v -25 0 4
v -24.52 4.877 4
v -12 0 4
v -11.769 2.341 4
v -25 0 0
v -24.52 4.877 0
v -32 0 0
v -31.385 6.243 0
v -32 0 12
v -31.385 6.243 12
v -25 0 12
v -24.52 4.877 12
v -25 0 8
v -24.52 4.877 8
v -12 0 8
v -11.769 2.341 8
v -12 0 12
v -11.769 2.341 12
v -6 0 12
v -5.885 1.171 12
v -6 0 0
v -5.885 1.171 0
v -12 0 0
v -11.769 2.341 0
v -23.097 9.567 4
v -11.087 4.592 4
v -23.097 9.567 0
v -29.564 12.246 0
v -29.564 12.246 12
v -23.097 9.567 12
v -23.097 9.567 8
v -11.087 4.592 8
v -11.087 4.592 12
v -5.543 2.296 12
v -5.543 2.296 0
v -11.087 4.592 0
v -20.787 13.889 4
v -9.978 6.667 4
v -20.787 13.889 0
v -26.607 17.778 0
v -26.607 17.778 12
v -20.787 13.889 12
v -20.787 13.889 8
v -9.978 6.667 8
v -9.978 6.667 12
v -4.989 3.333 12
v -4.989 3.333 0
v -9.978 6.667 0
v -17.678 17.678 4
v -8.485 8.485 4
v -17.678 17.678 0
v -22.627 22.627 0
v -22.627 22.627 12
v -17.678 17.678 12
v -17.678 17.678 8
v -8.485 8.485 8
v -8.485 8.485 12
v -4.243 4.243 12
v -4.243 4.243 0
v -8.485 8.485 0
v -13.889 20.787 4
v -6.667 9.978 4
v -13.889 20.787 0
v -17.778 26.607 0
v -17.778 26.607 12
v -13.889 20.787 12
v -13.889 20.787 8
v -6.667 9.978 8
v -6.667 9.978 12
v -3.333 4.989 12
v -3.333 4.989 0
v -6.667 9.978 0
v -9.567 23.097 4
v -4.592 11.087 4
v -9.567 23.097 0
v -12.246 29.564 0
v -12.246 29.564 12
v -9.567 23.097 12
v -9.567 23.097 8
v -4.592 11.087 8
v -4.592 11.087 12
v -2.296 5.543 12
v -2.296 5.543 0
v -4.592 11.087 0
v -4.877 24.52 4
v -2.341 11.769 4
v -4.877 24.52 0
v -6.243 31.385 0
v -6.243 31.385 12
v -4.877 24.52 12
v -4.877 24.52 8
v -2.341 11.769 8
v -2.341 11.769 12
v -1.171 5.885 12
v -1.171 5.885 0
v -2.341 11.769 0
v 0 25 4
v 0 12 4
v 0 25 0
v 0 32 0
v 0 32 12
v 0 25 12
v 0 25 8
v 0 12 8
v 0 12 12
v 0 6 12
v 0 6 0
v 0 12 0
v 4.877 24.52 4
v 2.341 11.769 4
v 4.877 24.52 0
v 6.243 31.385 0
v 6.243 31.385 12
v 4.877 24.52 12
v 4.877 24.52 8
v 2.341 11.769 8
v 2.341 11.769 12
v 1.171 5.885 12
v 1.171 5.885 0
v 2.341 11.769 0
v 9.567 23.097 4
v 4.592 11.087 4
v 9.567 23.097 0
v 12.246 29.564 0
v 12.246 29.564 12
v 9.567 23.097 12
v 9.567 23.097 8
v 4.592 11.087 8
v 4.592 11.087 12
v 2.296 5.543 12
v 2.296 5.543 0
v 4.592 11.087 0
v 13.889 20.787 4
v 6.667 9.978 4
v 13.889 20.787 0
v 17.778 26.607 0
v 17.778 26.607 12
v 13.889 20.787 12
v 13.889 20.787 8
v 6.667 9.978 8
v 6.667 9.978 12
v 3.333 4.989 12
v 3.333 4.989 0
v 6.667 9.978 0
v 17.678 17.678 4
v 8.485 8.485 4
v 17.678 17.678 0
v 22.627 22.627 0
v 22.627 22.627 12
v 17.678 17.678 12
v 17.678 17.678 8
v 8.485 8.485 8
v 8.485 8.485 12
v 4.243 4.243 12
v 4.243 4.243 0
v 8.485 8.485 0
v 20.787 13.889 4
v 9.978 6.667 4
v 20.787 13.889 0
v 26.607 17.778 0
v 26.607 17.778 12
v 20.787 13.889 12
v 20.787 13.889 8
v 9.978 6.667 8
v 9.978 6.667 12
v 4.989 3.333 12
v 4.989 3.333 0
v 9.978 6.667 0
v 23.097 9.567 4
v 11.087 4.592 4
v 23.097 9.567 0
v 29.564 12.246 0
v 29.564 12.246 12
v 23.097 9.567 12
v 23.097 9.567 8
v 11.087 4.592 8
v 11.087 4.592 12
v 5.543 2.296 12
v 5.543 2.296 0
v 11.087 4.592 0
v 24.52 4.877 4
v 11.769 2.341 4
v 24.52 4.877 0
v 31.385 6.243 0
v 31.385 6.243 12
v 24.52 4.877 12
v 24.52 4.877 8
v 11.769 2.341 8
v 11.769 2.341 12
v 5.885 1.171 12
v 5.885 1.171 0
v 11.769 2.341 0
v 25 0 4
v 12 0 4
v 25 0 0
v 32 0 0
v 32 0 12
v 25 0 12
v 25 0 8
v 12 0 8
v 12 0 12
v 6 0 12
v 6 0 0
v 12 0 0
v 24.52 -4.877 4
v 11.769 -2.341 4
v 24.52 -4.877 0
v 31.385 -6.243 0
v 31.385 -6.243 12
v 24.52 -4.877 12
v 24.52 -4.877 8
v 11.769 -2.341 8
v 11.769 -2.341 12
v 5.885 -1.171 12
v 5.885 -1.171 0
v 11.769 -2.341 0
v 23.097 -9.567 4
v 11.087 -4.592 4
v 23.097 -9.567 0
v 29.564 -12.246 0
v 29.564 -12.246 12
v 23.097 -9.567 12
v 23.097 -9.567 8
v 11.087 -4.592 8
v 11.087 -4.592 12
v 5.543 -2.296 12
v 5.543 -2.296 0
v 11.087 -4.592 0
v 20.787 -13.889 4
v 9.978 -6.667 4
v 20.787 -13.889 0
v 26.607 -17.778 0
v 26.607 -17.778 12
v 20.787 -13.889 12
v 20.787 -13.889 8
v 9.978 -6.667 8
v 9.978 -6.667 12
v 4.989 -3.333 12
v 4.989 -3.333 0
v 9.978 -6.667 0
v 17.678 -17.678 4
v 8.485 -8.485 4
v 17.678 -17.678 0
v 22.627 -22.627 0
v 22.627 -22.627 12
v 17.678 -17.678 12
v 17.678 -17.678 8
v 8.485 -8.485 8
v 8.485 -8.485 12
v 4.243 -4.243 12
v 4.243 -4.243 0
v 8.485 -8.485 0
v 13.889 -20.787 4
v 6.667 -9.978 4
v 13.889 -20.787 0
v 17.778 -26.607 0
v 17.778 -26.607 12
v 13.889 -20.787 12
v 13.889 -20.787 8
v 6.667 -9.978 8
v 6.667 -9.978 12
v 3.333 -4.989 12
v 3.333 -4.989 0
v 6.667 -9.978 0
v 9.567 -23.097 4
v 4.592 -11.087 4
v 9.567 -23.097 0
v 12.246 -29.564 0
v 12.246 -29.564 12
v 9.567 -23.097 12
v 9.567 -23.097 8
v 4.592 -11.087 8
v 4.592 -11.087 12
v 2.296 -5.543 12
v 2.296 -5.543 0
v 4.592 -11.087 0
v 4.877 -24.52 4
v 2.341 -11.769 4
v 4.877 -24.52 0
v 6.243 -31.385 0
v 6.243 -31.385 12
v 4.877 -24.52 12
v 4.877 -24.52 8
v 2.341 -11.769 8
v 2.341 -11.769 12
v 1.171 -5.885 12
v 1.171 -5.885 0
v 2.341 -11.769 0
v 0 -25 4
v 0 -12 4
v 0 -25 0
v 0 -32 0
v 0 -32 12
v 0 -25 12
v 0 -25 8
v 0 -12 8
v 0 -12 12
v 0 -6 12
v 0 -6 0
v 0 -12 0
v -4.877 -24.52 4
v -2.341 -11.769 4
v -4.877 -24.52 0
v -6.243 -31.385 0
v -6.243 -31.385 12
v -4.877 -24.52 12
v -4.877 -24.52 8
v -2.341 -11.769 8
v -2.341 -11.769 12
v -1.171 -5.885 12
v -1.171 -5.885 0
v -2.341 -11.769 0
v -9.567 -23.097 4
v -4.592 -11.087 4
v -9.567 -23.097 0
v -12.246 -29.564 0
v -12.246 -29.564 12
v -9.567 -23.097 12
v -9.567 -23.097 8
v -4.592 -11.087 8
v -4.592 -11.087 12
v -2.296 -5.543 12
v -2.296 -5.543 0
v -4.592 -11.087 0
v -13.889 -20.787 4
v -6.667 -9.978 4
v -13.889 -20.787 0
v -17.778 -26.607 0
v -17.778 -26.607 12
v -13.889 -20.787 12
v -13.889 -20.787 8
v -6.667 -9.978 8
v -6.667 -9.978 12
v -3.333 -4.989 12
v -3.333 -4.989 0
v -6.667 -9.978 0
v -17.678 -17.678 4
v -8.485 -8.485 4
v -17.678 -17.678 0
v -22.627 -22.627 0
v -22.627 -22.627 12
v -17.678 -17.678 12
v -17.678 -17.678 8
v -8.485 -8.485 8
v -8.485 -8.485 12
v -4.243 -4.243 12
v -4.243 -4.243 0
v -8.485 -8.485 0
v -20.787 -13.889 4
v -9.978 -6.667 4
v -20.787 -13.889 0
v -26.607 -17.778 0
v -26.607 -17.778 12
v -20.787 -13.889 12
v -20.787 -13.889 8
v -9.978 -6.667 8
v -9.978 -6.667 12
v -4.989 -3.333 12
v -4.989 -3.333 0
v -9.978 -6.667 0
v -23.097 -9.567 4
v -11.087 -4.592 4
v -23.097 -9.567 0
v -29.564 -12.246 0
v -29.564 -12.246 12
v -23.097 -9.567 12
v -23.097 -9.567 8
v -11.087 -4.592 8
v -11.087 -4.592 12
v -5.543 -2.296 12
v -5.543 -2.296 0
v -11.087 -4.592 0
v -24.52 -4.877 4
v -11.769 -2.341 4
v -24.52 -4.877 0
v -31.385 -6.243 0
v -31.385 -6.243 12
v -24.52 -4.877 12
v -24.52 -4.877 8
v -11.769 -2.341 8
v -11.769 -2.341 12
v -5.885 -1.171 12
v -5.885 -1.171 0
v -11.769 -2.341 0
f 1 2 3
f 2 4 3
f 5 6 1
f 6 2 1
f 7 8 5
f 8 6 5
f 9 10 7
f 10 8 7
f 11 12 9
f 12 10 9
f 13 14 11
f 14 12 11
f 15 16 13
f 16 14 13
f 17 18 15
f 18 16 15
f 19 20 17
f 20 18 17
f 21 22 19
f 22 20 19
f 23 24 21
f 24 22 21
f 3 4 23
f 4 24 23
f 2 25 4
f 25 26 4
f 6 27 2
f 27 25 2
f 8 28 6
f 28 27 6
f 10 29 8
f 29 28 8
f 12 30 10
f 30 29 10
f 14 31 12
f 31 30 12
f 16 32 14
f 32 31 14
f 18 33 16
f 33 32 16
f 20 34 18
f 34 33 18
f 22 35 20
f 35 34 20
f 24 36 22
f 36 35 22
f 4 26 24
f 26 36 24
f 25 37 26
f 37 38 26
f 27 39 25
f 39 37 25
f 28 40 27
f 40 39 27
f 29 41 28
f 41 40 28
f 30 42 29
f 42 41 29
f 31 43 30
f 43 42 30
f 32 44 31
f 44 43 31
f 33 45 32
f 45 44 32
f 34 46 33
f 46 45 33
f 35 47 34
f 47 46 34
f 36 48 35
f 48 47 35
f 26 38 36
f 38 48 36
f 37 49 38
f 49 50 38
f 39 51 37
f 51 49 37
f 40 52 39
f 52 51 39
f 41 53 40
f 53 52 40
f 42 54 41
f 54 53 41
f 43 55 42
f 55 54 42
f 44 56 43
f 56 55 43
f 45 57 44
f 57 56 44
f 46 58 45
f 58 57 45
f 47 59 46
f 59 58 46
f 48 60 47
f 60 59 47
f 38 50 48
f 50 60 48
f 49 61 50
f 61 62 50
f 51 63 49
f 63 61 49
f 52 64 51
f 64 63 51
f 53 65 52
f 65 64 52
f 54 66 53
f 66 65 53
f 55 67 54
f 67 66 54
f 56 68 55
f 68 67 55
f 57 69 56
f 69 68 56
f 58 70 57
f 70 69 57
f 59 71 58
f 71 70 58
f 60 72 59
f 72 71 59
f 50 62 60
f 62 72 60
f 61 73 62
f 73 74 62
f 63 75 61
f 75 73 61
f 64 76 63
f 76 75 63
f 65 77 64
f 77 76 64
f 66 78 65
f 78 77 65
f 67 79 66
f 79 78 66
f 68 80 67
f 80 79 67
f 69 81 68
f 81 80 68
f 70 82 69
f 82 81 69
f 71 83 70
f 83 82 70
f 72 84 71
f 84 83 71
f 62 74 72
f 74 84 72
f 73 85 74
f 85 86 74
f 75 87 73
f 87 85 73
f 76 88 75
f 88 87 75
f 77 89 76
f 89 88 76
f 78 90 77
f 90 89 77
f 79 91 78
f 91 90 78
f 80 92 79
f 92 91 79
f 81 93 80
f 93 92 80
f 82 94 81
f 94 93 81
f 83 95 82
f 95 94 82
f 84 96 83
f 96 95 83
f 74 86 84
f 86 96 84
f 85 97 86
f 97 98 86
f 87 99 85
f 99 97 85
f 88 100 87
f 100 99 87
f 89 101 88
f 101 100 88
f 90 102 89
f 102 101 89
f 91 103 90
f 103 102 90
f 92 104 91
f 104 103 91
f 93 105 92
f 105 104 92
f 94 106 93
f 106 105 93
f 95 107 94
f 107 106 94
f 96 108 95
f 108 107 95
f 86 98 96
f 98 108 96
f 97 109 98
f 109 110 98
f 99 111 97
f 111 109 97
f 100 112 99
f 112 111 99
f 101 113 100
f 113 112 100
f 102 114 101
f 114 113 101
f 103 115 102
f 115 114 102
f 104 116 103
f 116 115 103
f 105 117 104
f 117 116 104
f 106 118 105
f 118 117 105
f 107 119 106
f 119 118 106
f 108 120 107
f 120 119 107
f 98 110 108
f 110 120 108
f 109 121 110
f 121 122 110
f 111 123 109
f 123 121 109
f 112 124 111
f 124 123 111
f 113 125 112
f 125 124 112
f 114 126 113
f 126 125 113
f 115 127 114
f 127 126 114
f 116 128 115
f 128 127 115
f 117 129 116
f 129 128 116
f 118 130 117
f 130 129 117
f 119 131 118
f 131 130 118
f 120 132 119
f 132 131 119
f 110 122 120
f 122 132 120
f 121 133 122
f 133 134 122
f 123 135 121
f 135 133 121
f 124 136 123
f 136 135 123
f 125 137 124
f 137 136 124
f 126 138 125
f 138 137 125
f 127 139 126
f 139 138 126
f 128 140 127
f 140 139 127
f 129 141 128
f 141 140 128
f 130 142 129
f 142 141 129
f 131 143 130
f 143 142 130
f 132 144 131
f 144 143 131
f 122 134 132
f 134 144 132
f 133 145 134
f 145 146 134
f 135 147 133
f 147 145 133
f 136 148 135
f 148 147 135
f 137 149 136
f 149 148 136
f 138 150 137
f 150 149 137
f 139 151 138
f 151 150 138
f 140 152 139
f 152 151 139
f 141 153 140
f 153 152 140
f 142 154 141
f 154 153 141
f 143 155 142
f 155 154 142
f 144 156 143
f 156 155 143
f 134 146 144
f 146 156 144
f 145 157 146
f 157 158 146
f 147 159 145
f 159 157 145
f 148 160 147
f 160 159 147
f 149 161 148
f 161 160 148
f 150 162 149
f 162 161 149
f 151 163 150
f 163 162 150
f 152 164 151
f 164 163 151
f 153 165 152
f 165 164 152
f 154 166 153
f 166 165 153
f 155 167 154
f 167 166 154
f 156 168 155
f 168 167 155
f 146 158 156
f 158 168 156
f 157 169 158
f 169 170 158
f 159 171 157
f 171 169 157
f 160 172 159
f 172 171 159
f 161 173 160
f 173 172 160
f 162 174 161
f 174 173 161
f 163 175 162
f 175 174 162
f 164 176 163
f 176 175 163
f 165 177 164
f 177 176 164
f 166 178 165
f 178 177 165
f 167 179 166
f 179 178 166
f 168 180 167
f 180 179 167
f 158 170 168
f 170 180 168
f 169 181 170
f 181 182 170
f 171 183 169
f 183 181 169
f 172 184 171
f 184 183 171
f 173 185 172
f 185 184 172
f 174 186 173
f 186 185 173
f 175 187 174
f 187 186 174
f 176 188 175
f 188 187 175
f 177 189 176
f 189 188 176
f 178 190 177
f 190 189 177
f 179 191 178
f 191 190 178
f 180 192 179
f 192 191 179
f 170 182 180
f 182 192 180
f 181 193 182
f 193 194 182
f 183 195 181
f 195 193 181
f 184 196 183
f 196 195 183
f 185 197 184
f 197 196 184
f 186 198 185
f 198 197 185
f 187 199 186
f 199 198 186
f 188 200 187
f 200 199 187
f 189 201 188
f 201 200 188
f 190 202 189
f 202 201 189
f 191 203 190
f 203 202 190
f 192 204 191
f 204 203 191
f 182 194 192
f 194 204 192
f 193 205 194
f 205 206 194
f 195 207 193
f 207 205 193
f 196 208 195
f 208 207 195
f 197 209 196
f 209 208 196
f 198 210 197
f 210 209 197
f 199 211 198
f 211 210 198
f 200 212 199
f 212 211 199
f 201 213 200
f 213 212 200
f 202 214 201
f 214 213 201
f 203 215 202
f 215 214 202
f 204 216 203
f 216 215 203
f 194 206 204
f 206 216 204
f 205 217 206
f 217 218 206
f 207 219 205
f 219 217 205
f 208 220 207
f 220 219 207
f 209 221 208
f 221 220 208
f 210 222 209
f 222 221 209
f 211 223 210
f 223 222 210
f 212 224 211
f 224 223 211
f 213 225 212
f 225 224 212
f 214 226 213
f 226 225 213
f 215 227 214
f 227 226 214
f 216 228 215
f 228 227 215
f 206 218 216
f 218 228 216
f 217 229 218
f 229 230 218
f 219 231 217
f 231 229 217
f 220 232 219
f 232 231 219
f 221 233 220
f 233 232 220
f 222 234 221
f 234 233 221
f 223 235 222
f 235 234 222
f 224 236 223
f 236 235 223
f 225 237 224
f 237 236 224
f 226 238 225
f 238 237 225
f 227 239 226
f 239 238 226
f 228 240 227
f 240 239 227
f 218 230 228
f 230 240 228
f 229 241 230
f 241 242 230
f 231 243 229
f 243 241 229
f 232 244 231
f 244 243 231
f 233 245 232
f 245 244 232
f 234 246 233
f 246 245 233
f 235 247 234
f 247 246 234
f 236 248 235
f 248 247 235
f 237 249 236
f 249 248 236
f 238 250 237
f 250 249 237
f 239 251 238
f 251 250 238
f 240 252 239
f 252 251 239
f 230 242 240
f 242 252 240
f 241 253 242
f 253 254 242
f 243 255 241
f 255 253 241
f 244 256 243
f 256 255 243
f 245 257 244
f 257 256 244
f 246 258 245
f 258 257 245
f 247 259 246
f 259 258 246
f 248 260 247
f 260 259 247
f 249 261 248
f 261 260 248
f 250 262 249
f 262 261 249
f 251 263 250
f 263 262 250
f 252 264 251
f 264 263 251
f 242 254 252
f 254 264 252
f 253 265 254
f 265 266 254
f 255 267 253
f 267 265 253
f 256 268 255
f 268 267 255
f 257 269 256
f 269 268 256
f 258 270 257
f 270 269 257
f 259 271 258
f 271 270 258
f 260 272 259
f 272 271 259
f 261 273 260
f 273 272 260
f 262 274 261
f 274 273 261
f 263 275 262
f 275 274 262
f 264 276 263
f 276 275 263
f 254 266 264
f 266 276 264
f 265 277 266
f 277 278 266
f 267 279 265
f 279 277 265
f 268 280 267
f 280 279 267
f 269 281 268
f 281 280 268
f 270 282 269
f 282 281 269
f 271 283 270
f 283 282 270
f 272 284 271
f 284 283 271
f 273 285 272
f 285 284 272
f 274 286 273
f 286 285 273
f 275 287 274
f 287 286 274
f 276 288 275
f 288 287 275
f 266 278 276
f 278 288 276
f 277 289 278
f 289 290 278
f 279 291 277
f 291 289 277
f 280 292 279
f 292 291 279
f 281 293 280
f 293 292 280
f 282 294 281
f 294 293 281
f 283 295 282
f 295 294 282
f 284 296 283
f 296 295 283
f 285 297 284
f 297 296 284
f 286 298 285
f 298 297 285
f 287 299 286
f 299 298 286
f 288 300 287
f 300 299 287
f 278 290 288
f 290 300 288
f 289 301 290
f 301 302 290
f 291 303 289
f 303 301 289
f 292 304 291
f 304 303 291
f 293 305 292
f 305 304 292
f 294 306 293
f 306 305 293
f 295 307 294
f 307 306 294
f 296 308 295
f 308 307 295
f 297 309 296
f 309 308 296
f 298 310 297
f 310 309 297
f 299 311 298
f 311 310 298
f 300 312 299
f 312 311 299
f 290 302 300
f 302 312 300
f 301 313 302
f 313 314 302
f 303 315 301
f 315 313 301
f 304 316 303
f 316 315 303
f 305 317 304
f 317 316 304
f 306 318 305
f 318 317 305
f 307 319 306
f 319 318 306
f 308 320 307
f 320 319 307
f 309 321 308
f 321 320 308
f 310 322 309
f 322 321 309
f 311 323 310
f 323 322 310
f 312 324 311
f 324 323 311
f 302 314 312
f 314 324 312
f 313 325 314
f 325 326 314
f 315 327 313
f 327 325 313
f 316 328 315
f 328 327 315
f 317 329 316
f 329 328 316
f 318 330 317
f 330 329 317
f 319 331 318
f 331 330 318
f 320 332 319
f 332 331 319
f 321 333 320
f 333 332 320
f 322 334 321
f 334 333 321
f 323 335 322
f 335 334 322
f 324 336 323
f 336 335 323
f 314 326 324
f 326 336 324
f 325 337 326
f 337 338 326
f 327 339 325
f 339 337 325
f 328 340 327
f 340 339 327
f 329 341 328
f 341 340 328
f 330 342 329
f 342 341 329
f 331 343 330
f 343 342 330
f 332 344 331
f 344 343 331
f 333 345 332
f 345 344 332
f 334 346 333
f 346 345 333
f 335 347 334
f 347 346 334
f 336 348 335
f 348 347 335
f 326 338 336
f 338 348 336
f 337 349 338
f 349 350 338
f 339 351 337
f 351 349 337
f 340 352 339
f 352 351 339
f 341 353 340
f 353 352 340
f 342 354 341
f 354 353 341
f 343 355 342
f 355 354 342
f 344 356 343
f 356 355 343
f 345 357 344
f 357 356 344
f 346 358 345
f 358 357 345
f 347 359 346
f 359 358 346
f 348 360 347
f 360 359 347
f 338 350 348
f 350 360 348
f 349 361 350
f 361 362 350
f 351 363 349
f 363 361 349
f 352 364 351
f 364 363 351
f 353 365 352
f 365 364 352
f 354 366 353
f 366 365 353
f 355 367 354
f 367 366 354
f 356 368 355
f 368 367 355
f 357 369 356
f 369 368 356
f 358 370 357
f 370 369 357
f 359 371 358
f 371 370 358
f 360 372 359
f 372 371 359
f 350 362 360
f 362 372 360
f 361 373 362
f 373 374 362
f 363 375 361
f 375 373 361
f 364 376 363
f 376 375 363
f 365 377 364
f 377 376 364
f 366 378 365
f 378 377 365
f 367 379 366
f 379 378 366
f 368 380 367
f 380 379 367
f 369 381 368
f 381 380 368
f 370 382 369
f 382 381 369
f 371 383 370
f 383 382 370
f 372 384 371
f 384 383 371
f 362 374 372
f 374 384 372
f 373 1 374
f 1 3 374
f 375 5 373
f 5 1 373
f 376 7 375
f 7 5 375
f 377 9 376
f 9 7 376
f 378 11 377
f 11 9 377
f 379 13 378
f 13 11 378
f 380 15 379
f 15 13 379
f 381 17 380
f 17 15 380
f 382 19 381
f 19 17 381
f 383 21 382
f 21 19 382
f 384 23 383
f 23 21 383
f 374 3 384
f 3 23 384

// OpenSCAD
$fn = 32;
// target_bbox: 64, 64, 12
// ----------------------------------------------------------------------
// Revolved part: handwheel R32
// ----------------------------------------------------------------------

// --- parameters (mm) ---
bore_r = 6;               // bore radius
rim_r = 32;               // rim radius
rim_w = 7;                // rim axial width
rim_t = 12;               // rim diameter height
hub_r = 12;               // hub radius
web_t = 4;                // web thickness
revolve_angle = 360;      // revolve sweep, degrees

bore_d = 2 * bore_r;
rim_d = 2 * rim_r;
hub_d = 2 * hub_r;

profile = [[6, 0], [12, 0], [12, 4], [25, 4], [25, 0], [32, 0], [32, 12], [25, 12], [25, 8], [12, 8], [12, 12], [6, 12]];  // primary outline, 12 points, counter clockwise

// --- the one profile operation ---
rotate_extrude(angle = revolve_angle) polygon(points = profile);
